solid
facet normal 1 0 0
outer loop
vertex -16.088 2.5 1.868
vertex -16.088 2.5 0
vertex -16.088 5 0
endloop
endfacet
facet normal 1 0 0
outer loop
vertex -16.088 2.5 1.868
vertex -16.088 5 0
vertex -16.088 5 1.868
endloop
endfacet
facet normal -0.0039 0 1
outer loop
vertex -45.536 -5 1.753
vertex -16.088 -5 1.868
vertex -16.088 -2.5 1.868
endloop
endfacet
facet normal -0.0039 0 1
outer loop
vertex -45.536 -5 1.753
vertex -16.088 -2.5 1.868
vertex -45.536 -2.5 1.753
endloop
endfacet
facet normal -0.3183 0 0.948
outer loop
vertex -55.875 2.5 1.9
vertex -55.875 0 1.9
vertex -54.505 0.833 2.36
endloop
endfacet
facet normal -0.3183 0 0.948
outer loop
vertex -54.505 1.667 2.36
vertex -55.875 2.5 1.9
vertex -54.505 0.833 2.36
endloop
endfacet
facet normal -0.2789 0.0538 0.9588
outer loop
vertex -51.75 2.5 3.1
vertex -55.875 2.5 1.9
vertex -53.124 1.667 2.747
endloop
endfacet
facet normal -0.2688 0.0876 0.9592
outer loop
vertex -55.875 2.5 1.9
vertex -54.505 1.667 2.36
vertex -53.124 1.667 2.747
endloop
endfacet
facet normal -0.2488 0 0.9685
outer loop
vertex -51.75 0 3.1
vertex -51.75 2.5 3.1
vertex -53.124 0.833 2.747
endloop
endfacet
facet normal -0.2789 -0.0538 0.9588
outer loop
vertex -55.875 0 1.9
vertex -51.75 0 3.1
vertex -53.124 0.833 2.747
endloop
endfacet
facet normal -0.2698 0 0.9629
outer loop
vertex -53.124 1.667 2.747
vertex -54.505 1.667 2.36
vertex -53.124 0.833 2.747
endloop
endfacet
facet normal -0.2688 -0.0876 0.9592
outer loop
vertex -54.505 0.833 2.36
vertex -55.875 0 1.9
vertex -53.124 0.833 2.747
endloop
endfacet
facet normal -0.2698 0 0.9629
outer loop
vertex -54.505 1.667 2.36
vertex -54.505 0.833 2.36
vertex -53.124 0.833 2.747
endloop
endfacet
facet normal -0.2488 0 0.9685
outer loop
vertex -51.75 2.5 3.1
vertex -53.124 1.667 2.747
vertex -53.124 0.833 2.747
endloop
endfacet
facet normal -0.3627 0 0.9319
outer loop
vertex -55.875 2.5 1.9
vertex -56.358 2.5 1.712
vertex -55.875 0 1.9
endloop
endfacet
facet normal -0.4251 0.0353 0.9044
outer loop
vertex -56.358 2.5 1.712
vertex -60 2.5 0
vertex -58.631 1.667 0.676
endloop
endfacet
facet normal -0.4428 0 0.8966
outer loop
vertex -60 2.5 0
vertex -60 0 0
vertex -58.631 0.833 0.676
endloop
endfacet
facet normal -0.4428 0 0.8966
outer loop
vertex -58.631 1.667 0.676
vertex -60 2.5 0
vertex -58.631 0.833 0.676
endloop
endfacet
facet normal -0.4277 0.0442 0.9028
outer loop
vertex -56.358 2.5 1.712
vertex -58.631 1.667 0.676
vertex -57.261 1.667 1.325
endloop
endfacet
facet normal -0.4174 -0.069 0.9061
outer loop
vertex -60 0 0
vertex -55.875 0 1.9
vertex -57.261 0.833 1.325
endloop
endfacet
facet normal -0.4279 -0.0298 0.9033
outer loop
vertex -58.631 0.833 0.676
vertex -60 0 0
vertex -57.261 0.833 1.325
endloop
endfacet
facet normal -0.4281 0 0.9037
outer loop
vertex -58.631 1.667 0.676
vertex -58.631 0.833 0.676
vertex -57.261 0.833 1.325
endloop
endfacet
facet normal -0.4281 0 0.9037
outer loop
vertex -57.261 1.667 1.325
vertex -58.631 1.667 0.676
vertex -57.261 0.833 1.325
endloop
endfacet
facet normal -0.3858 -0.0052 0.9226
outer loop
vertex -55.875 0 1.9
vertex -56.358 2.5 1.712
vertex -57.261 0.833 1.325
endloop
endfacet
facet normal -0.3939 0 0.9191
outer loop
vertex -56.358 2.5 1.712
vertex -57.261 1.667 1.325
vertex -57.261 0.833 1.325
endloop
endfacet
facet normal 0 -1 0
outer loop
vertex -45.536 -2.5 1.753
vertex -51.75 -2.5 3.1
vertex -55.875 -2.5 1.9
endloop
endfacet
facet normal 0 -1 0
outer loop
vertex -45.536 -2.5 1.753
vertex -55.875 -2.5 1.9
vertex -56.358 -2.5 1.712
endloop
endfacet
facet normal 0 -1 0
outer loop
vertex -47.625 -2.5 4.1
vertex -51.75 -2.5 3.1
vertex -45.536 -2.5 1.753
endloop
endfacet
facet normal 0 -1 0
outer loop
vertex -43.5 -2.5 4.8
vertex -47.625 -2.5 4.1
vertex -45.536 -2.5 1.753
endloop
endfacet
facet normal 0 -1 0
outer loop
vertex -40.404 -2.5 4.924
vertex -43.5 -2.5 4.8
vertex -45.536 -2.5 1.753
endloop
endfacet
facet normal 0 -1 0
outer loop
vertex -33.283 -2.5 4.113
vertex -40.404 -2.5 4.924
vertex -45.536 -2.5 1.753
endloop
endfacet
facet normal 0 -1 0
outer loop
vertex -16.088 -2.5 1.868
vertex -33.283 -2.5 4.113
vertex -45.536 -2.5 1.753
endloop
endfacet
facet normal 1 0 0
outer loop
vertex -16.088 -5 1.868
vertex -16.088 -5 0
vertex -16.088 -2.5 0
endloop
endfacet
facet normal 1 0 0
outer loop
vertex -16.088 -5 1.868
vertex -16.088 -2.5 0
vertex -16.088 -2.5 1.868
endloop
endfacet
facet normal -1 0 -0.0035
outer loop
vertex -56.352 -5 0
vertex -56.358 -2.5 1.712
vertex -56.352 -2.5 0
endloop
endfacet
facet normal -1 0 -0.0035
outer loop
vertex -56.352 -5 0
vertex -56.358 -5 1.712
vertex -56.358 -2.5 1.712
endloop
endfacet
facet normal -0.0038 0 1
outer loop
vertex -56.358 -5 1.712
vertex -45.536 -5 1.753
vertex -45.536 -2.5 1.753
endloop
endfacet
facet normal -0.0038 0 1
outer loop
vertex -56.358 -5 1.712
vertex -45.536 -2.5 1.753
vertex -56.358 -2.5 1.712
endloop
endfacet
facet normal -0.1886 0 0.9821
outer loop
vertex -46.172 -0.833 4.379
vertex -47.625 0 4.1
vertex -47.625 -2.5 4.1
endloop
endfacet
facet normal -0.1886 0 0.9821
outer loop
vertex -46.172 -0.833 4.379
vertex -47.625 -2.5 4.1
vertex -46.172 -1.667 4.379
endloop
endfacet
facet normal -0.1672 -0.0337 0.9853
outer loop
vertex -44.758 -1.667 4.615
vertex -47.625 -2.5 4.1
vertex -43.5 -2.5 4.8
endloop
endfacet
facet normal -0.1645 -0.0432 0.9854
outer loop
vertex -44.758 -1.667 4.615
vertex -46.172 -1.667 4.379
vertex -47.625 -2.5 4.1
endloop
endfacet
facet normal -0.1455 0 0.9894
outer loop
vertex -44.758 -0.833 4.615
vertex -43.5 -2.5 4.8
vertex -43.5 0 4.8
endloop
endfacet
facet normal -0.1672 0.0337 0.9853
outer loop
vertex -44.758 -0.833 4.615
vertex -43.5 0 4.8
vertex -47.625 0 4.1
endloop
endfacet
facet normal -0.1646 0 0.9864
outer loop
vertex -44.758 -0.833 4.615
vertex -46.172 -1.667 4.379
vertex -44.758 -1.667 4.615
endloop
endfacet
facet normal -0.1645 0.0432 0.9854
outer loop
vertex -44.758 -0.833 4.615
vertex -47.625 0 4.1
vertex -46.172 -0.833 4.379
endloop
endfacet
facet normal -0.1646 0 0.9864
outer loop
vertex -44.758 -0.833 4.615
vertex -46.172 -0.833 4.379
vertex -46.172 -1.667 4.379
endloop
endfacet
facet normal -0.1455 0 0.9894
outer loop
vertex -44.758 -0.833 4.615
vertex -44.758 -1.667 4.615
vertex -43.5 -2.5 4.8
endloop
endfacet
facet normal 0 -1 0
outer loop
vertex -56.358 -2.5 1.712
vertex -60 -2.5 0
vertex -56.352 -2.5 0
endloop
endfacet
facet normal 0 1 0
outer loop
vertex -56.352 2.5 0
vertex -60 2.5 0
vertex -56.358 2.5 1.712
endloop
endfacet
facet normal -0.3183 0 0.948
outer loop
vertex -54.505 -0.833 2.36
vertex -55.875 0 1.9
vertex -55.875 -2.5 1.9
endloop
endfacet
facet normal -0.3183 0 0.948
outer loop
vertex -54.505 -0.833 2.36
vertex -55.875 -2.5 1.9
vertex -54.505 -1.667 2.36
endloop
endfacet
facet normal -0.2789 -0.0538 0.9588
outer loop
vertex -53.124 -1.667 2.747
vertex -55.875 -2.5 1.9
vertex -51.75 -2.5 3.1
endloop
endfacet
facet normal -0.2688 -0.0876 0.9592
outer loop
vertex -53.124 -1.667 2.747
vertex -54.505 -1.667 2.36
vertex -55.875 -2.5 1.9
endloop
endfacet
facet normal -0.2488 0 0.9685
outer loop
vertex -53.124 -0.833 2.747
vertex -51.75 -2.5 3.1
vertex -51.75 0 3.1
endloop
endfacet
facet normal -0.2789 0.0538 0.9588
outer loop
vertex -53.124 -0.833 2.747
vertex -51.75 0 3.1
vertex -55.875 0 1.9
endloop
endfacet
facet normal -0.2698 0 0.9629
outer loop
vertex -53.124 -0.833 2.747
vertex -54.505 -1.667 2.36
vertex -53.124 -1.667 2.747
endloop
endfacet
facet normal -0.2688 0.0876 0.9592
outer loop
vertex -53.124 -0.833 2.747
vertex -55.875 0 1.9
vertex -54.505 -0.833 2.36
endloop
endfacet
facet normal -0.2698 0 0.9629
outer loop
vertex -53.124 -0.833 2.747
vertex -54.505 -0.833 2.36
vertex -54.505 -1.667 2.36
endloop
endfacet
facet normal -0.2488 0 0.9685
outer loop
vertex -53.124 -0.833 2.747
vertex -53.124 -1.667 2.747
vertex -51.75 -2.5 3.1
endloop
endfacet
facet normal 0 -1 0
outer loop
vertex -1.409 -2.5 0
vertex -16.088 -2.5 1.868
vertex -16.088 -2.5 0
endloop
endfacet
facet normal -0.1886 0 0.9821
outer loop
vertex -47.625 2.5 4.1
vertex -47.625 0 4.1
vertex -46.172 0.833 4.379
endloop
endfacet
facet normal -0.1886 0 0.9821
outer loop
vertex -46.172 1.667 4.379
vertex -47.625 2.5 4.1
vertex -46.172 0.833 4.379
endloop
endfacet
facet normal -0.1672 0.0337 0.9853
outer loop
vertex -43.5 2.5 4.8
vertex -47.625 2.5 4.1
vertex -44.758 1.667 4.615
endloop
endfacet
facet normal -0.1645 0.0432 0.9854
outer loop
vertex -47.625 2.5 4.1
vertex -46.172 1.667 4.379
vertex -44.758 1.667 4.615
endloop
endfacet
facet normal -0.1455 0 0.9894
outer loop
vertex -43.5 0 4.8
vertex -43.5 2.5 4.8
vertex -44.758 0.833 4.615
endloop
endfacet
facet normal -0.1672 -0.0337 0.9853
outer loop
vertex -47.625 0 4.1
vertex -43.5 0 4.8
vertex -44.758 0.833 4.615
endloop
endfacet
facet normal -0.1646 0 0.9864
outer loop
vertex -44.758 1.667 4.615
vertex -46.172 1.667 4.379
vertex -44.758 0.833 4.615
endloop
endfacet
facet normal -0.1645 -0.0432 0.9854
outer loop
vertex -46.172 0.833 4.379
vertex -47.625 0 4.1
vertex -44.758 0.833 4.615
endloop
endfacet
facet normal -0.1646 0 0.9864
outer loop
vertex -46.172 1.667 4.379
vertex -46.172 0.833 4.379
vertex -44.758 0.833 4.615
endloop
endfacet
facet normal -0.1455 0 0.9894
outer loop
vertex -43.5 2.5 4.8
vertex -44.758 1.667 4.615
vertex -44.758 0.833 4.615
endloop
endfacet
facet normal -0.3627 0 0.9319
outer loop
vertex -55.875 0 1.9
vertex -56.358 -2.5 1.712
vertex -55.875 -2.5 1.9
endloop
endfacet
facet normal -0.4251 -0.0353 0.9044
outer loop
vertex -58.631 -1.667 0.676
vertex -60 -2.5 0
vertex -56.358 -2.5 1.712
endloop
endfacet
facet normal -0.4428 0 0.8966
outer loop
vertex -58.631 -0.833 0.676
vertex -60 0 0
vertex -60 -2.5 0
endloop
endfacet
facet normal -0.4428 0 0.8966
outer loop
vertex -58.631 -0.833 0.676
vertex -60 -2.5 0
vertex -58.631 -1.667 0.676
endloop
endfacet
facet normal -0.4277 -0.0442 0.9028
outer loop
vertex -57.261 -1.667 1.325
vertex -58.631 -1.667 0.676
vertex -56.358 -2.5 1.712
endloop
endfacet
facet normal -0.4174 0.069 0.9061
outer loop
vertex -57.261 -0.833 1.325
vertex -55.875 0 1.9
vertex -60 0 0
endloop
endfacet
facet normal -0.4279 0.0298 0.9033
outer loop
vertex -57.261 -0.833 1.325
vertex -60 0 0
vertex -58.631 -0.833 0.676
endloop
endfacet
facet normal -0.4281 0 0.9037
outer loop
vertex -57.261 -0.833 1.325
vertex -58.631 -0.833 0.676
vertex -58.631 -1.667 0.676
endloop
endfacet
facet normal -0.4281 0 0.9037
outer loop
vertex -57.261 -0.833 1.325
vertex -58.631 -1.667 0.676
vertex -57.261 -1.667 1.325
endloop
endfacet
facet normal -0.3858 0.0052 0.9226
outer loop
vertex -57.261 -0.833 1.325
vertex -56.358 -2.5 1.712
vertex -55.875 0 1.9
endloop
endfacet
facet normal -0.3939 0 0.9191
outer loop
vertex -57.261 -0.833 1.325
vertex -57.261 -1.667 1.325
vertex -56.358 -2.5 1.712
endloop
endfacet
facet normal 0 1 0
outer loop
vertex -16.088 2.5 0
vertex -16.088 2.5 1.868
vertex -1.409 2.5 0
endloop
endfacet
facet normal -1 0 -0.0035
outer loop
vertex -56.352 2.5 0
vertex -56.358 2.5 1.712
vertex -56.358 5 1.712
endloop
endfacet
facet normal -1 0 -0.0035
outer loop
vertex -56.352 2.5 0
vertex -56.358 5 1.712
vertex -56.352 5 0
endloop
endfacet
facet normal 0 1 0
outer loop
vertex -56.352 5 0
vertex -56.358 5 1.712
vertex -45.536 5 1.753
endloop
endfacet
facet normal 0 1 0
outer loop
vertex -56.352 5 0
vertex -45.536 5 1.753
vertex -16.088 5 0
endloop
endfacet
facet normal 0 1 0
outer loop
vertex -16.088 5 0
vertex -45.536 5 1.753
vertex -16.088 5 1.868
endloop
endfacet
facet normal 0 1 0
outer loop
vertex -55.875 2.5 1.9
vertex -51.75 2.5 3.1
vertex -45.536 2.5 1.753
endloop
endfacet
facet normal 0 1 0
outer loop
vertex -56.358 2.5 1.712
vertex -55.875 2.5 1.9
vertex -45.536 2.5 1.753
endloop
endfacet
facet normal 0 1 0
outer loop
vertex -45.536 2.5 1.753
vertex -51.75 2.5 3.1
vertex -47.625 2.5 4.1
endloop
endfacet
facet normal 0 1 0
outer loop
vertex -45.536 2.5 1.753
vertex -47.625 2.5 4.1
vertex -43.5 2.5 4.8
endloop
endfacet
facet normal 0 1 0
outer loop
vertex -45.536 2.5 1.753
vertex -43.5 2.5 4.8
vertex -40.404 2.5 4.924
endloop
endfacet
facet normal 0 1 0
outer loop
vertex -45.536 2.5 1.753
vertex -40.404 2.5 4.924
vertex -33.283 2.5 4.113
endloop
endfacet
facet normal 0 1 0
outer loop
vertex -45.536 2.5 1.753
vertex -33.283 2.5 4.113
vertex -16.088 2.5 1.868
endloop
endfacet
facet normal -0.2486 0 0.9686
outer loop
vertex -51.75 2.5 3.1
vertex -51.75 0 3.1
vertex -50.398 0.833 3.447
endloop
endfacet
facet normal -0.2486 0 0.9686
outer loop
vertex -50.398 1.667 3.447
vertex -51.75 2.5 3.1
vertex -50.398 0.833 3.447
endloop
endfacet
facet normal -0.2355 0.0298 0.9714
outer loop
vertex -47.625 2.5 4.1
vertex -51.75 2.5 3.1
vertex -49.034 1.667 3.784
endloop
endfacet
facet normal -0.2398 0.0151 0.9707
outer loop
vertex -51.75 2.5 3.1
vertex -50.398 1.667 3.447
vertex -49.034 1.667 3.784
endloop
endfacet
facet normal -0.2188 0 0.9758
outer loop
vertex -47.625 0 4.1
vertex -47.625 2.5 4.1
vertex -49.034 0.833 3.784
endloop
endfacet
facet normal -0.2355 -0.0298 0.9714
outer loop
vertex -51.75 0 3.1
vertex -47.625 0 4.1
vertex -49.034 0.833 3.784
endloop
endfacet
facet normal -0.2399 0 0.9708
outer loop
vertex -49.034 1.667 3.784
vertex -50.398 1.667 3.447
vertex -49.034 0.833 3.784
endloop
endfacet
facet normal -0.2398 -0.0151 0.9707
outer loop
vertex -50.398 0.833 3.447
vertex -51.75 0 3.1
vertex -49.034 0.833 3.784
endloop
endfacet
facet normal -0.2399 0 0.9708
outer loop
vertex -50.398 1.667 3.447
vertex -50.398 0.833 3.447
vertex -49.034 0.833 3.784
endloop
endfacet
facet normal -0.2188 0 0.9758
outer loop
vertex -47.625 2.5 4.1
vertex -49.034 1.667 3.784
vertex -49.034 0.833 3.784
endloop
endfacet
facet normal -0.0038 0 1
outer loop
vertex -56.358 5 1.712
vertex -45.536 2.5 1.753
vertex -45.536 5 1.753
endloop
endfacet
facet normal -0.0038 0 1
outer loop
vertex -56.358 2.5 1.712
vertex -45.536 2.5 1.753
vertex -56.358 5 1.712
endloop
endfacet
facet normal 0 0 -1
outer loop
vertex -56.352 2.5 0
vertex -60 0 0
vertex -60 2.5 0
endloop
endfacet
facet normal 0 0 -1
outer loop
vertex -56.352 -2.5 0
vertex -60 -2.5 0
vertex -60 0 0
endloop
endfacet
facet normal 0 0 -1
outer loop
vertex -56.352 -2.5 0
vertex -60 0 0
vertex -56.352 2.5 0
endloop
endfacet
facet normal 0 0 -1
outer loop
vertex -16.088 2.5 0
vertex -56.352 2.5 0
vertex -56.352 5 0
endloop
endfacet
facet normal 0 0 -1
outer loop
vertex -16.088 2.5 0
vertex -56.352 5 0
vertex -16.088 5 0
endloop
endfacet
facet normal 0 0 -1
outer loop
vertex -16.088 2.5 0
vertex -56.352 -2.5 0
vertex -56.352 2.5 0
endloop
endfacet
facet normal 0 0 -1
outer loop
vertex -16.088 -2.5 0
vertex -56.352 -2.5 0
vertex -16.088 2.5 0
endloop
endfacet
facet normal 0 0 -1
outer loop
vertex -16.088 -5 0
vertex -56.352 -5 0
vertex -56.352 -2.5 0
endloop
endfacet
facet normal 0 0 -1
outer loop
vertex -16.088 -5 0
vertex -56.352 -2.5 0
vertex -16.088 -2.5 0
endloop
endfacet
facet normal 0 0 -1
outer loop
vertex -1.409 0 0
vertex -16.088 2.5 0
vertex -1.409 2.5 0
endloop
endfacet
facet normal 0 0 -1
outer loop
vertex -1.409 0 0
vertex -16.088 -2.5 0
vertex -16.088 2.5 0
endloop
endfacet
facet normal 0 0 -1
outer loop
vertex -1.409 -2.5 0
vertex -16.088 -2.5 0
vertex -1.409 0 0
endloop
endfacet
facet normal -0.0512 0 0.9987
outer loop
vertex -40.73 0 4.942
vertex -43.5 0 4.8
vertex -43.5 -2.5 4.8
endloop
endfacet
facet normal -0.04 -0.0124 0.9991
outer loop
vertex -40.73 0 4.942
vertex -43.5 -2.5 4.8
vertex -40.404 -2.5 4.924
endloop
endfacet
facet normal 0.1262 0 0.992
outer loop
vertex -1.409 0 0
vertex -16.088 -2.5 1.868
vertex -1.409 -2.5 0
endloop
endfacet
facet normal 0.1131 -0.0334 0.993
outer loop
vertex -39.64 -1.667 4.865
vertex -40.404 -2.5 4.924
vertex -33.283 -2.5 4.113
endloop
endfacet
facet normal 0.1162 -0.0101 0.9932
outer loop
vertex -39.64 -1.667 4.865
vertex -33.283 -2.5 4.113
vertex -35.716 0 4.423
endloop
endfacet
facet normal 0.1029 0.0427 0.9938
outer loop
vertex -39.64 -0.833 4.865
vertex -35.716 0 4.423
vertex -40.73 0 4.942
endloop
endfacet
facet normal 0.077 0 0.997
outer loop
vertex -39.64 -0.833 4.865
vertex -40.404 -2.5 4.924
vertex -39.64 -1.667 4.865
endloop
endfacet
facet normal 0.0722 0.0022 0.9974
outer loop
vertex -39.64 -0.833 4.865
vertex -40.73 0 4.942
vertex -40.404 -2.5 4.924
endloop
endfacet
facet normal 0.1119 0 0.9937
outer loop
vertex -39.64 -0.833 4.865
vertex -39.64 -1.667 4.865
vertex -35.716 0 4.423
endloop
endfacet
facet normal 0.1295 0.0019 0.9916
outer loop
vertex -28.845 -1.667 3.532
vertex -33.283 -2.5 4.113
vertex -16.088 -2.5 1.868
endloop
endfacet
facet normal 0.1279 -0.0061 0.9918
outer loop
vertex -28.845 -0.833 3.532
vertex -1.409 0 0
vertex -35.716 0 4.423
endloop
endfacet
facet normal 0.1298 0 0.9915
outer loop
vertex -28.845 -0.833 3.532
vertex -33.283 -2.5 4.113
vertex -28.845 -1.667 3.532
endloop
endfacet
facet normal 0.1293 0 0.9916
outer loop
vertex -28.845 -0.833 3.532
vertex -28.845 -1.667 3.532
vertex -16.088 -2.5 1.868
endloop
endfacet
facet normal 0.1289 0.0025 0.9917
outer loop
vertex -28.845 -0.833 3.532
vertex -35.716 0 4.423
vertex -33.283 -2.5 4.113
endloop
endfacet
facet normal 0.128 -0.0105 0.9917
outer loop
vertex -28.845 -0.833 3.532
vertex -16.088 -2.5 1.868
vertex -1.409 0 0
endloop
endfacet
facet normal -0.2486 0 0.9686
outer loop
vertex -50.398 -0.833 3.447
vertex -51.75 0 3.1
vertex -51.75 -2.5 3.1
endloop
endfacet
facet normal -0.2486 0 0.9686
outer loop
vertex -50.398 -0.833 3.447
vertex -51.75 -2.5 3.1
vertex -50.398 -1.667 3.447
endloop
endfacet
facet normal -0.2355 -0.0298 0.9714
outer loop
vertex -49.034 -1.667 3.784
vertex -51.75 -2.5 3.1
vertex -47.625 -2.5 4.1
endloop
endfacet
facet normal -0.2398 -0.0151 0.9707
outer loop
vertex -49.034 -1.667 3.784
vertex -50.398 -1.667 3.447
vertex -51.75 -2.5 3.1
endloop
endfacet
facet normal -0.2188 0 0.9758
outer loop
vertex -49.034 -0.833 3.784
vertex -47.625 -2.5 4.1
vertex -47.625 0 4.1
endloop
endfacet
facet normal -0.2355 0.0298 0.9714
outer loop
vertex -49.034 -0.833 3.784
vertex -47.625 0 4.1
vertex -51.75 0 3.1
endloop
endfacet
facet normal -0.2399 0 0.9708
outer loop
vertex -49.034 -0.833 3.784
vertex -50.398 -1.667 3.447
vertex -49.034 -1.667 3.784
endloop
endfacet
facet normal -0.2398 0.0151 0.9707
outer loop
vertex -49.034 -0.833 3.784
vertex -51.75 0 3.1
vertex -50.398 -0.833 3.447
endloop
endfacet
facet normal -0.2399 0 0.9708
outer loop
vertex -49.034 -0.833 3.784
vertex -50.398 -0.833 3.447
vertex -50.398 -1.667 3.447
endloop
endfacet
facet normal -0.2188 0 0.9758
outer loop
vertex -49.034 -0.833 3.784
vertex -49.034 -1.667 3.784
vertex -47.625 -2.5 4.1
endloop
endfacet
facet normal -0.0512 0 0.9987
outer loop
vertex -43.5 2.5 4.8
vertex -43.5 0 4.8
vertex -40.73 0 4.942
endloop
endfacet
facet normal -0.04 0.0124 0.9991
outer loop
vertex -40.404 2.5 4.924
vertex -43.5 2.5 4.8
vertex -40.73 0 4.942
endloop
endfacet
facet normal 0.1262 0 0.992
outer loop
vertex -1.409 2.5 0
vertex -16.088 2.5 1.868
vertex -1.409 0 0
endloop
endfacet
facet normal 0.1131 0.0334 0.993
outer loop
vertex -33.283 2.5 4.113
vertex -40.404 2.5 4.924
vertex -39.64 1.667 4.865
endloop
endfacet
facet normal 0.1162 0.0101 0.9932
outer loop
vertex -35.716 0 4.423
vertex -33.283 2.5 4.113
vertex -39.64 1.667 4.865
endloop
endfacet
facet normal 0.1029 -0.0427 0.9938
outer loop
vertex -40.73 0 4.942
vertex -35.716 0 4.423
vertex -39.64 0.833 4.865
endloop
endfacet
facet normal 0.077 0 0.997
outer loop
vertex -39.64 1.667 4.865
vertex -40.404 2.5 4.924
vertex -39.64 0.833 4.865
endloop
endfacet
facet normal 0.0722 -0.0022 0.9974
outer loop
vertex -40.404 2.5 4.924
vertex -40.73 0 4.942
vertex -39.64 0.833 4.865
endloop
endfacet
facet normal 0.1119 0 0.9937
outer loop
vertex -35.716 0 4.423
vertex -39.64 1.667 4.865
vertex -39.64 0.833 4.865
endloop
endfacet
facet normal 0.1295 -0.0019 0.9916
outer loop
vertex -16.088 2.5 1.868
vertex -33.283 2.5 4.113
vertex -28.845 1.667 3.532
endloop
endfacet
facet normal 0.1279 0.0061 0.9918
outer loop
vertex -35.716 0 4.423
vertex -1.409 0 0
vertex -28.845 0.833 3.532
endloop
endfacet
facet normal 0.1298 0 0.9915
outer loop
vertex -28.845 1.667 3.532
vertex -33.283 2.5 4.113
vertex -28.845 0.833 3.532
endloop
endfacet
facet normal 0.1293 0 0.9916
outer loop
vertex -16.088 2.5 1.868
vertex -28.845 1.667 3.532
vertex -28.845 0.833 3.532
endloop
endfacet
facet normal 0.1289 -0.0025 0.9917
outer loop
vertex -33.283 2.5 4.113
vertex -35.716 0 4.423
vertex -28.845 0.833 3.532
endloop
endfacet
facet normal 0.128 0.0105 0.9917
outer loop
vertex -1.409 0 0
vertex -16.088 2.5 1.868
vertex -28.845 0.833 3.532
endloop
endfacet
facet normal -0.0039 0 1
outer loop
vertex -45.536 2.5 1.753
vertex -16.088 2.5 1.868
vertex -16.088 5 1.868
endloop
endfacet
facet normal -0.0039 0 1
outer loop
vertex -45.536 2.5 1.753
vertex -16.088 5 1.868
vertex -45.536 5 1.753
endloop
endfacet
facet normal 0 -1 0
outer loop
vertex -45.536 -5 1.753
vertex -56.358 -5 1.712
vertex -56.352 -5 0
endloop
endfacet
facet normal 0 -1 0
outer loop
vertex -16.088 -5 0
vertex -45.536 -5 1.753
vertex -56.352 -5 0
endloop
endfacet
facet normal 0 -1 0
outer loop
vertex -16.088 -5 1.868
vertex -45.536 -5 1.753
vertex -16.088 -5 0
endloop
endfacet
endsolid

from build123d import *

# Parameters (mm, degrees)
F1_DEPTH = 2.5
F3_DEPTH = 5


with BuildPart() as f1:
    # F0 (on Front) → F1 (new body, symmetric)
    with BuildSketch(Plane.XZ):
        with BuildLine():
            Line((-43.5, 0), (-1.4094070066, 0))
            add(Edge.make_bspline(
                [(-43.5, 4.8), (-39.8710331933, 5.2983873013), (-40.401533246, 4.8974864185), (-1.4094070066, 0)],
                knots=[0.5607612566, 0.5607612566, 0.5607612566, 0.5607612566, 1, 1, 1, 1], degree=3))
            Line((-43.5, 4.8), (-43.5, 0))
        make_face()
        with BuildLine():
            Line((-47.625, 0), (-43.5, 0))
            Line((-43.5, 0), (-43.5, 4.8))
            add(Edge.make_bspline(
                [(-47.625, 4.1), (-46.191734982, 4.3979293395), (-44.6404650354, 4.643373246), (-43.5, 4.8)],
                knots=[0.422722951, 0.422722951, 0.422722951, 0.422722951, 0.5607612566, 0.5607612566, 0.5607612566, 0.5607612566], degree=3))
            Line((-47.625, 4.1), (-47.625, 0))
        make_face()
        with BuildLine():
            Line((-51.75, 0), (-47.625, 0))
            Line((-47.625, 0), (-47.625, 4.1))
            add(Edge.make_bspline(
                [(-51.75, 3.1), (-50.3924722152, 3.446603597), (-49.0685918755, 3.7999240416), (-47.625, 4.1)],
                knots=[0.2836900617, 0.2836900617, 0.2836900617, 0.2836900617, 0.422722951, 0.422722951, 0.422722951, 0.422722951], degree=3))
            Line((-51.75, 3.1), (-51.75, 0))
        make_face()
        with BuildLine():
            Line((-60, 0), (-55.875, 0))
            Line((-55.875, 0), (-55.875, 1.9))
            add(Edge.make_bspline(
                [(-60, 0), (-58.6279008986, 0.6754279552), (-57.2727716722, 1.3762478568), (-55.875, 1.9)],
                knots=[0, 0, 0, 0, 0.14381593, 0.14381593, 0.14381593, 0.14381593], degree=3))
        make_face()
        with BuildLine():
            Line((-55.875, 0), (-51.75, 0))
            Line((-51.75, 0), (-51.75, 3.1))
            add(Edge.make_bspline(
                [(-55.875, 1.9), (-54.5155393398, 2.4093968124), (-53.1157417417, 2.751299218), (-51.75, 3.1)],
                knots=[0.14381593, 0.14381593, 0.14381593, 0.14381593, 0.2836900617, 0.2836900617, 0.2836900617, 0.2836900617], degree=3))
            Line((-55.875, 1.9), (-55.875, 0))
        make_face()
    extrude(amount=F1_DEPTH, both=True)

    # F2 (on Front) → F3 (join, symmetric)
    with BuildSketch(Plane.XZ):
        with BuildLine():
            Line((-56.3516374265, 0), (-48.6134569347, 0))
            add(Edge.make_bspline(
                [(-45.5359602044, 1.7534863618), (-46.4926973174, 1.2011188271), (-47.5249209999, 0.6140901608), (-48.6134569347, 0)],
                knots=[25.5941661656, 25.5941661656, 25.5941661656, 25.5941661656, 27.1611911657, 27.1611911657, 27.1611911657, 27.1611911657], degree=3))
            Line((-45.5359602044, 1.7534863618), (-56.3582745625, 1.7115182598))
            Line((-56.3582745625, 1.7115182598), (-56.3516374265, 0))
        make_face()
        with BuildLine():
            Line((-48.6134569347, 0), (-16.0882583667, 0))
            Line((-16.0882583667, 0), (-16.0882583667, 1.8676822825))
            Line((-16.0882583667, 1.8676822825), (-45.5359602044, 1.7534863618))
            add(Edge.make_bspline(
                [(-45.5359602044, 1.7534863618), (-46.4926973174, 1.2011188271), (-47.5249209999, 0.6140901608), (-48.6134569347, 0)],
                knots=[25.5941661656, 25.5941661656, 25.5941661656, 25.5941661656, 27.1611911657, 27.1611911657, 27.1611911657, 27.1611911657], degree=3))
        make_face()
    extrude(amount=F3_DEPTH, both=True)


solid = f1.part
